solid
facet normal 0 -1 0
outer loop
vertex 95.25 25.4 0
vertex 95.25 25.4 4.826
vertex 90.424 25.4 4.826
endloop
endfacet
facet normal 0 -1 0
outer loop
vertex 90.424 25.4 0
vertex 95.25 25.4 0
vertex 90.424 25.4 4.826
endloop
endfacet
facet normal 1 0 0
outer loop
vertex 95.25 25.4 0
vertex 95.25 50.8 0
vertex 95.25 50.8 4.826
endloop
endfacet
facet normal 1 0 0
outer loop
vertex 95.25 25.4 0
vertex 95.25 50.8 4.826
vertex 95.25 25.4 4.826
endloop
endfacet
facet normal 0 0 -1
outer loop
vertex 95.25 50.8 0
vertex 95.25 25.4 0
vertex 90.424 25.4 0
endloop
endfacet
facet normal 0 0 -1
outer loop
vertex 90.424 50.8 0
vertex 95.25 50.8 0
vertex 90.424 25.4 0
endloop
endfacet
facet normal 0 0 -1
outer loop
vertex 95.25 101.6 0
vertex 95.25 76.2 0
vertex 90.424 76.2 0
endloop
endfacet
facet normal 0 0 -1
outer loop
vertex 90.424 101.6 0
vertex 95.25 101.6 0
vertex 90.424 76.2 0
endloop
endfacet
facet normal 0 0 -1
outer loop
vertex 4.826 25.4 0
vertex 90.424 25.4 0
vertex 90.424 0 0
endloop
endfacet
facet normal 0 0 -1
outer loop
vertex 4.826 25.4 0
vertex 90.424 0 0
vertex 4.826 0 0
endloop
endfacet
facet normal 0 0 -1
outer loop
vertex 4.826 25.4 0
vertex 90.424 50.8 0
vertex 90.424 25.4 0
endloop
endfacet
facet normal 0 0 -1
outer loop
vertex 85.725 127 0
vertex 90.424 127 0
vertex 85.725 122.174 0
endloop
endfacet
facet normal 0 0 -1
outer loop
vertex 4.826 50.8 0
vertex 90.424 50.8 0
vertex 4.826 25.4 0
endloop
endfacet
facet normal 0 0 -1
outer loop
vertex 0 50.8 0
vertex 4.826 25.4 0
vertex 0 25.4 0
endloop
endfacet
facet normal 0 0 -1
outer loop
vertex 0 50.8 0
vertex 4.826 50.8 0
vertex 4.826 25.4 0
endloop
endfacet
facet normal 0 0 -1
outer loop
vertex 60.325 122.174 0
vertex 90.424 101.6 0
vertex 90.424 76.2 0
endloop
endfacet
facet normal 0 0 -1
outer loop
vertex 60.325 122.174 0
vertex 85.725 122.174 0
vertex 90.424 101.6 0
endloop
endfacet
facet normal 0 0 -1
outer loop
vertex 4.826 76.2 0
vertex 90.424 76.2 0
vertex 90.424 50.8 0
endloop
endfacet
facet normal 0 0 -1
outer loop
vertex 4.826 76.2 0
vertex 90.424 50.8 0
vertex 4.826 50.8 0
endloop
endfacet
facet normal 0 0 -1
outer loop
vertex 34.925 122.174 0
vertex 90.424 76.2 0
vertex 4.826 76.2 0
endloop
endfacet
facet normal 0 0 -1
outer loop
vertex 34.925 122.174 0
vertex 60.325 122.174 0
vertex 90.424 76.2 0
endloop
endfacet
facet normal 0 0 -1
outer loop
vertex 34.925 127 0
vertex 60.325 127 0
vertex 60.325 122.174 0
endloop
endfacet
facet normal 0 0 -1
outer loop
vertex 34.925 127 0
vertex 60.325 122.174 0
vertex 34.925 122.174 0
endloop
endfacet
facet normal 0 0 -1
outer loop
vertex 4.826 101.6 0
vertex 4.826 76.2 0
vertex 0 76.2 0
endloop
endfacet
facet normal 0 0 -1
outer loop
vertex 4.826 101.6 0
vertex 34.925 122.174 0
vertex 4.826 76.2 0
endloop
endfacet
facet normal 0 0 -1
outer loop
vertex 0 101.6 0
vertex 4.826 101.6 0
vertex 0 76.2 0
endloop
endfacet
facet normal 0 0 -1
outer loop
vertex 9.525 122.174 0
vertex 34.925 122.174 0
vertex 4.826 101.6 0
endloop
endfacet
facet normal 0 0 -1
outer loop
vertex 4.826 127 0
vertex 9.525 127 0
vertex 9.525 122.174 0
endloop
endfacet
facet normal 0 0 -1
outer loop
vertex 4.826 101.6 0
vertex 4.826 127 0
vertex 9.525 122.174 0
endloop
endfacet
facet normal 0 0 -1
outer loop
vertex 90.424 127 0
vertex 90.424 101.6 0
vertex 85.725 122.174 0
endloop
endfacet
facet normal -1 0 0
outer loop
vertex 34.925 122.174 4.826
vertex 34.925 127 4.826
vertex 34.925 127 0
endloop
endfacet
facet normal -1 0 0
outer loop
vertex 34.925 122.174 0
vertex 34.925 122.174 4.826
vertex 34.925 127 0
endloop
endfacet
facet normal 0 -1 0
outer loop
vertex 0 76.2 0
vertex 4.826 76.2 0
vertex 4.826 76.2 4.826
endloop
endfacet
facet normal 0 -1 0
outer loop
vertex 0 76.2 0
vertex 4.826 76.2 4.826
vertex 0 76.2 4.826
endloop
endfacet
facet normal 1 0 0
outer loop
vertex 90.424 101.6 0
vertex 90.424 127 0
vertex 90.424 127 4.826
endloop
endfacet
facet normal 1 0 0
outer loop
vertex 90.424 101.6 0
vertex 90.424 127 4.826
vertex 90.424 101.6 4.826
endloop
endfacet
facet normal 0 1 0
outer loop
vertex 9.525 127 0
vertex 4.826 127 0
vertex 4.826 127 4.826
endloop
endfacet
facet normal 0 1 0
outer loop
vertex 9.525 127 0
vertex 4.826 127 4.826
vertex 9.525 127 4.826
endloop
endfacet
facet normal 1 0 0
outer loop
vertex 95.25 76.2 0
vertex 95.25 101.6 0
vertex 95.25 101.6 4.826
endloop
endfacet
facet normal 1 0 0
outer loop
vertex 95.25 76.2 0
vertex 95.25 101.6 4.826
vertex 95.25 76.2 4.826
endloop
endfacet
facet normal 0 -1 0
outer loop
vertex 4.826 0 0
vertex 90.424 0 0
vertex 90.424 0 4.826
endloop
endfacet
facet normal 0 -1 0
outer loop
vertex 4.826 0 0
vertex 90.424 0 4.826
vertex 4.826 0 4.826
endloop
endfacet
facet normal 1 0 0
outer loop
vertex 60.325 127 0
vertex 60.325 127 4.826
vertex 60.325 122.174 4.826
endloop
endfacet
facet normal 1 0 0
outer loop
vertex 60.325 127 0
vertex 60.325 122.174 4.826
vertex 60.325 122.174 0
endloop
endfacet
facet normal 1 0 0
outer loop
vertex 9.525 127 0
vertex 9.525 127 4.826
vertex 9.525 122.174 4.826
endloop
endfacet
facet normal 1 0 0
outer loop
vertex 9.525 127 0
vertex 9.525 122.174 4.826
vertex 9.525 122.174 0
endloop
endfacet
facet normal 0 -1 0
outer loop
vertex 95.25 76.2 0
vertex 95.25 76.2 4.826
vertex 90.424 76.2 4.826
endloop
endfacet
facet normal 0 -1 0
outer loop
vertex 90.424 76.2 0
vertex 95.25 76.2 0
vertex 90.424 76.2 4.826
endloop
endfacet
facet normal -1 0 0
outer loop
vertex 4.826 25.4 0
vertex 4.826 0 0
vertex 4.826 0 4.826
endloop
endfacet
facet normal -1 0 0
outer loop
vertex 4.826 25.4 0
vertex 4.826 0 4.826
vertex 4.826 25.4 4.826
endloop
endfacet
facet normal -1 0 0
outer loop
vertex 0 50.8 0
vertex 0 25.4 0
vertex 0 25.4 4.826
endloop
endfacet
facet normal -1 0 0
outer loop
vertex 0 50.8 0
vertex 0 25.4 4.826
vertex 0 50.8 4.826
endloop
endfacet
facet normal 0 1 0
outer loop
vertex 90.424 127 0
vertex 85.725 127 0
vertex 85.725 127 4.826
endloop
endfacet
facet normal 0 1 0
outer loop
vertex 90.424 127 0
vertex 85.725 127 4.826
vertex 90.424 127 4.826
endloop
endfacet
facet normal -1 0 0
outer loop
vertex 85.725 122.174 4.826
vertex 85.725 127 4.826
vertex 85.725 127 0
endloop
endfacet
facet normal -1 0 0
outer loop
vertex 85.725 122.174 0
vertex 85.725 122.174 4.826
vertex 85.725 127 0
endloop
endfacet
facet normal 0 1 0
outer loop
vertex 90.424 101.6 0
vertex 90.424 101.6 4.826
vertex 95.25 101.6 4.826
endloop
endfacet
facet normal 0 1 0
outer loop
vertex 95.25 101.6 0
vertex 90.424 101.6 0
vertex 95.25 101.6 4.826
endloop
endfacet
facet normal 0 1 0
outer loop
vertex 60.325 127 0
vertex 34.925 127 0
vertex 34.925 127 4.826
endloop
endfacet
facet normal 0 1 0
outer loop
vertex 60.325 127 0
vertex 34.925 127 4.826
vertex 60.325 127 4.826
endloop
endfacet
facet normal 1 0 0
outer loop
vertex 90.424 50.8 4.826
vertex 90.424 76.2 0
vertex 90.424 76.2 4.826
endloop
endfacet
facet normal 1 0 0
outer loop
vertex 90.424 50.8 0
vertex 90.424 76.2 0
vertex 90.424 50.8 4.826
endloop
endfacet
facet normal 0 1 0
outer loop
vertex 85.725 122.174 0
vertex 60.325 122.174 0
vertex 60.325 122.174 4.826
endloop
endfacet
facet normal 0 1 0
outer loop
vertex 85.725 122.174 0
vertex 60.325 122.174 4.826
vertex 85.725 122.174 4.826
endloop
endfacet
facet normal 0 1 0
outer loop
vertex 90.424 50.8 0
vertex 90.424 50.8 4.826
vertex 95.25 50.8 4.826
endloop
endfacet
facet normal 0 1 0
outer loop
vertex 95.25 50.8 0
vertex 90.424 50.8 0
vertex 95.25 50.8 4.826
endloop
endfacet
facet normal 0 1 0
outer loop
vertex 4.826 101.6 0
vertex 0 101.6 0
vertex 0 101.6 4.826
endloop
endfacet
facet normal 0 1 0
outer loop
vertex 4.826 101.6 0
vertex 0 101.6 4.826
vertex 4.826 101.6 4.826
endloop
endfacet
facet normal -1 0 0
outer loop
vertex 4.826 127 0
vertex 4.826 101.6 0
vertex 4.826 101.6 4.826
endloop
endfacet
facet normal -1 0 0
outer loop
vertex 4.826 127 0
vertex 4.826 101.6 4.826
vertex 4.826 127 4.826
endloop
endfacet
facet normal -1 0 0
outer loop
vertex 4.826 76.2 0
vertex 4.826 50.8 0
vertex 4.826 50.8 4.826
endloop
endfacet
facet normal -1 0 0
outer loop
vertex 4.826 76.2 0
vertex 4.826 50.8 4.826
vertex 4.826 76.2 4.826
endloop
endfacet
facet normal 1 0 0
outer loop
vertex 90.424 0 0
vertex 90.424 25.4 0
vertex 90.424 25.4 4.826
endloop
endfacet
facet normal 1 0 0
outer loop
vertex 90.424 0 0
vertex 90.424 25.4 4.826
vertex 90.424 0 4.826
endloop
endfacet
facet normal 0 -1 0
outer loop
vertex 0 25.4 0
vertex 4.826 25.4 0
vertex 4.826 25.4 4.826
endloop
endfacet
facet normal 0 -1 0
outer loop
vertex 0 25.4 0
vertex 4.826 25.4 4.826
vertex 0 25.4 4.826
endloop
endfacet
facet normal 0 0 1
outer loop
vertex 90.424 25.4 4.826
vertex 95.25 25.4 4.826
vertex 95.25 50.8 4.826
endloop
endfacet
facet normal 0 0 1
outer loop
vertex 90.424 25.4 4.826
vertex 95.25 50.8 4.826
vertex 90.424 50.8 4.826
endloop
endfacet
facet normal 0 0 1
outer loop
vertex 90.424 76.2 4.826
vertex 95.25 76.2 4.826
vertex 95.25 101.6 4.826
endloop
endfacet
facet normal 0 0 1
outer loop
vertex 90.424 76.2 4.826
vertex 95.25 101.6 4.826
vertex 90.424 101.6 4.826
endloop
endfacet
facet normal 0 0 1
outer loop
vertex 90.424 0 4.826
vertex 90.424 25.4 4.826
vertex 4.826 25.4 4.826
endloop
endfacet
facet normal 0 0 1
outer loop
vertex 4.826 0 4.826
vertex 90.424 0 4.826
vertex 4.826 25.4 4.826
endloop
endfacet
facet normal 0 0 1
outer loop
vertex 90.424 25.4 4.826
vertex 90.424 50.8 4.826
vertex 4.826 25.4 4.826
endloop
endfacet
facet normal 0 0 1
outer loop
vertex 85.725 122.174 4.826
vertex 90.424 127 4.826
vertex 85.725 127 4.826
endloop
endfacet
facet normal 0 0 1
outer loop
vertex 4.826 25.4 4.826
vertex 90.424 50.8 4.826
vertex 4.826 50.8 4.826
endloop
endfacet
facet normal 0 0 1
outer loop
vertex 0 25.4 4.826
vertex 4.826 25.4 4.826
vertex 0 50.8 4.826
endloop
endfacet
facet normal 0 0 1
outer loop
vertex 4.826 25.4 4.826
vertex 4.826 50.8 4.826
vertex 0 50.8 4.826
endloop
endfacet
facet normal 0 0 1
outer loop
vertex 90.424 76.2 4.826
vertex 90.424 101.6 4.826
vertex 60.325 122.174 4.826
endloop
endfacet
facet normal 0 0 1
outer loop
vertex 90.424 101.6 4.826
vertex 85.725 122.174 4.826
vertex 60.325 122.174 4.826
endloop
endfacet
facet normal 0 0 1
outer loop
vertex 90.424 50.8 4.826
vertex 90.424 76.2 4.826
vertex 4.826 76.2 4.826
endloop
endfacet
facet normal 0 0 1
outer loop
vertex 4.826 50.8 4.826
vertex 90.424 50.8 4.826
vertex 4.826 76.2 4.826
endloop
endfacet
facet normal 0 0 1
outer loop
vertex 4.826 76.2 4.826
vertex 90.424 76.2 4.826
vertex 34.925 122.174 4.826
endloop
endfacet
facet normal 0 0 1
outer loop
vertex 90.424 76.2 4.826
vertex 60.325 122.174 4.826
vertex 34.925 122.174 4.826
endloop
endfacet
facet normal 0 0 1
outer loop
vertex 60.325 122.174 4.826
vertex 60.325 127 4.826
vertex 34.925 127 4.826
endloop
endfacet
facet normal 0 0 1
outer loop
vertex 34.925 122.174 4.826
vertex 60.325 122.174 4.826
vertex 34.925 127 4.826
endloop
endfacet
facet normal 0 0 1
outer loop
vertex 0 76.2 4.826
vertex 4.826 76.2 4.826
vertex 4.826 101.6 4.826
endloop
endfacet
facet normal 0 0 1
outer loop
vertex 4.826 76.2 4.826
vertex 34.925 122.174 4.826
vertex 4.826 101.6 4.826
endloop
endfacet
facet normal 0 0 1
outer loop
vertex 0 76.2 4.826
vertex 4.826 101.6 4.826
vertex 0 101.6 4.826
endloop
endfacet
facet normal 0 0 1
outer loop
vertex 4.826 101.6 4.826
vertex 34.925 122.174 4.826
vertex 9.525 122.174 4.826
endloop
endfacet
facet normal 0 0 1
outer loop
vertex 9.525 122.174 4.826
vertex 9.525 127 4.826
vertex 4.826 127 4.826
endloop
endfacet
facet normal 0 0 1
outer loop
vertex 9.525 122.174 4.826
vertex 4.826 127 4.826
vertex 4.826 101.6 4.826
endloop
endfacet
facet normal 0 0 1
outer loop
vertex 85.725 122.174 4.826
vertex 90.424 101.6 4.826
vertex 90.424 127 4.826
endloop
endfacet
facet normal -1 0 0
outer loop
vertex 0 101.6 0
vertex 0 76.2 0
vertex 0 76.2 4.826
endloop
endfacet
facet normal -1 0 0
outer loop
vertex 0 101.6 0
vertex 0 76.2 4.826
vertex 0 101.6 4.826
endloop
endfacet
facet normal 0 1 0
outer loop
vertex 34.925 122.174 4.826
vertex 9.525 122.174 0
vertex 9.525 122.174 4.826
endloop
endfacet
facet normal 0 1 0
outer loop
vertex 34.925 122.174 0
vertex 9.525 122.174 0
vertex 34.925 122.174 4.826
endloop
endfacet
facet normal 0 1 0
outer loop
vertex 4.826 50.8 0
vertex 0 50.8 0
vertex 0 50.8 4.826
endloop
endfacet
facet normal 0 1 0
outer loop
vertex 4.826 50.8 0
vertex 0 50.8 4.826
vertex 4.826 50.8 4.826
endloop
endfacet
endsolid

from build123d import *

# Parameters (mm, degrees)
BOSS_EXTRUDE1_DEPTH = 4.826
SKETCH2_W           = 25.4
SKETCH2_H           = 4.826
CUT_EXTRUDE1_DEPTH  = 4.826


with BuildPart() as part:
    # Sketch1 → Boss-Extrude1 (new body)
    with BuildSketch(Plane.XY):
        Polygon((0, 76.2), (0, 101.6), (4.826, 101.6), (4.826, 127), (90.424, 127), (90.424, 101.6), (95.25, 101.6), (95.25, 76.2), (90.424, 76.2), (90.424, 50.8), (95.25, 50.8), (95.25, 25.4), (90.424, 25.4), (90.424, 0), (4.826, 0), (4.826, 25.4), (0, 25.4), (0, 50.8), (4.826, 50.8), (4.826, 76.2), align=None)
    extrude(amount=BOSS_EXTRUDE1_DEPTH)

    # Sketch2 → Cut-Extrude1 (cut)
    with BuildSketch(Plane(origin=(0, 127, 0), x_dir=(1, 0, 0), z_dir=(0, 1, 0))):
        with Locations((73.025, -2.413)):
            Rectangle(SKETCH2_W, SKETCH2_H)
        with Locations((22.225, -2.413)):
            Rectangle(SKETCH2_W, SKETCH2_H)
    extrude(amount=-CUT_EXTRUDE1_DEPTH, mode=Mode.SUBTRACT)


solid = part.part
